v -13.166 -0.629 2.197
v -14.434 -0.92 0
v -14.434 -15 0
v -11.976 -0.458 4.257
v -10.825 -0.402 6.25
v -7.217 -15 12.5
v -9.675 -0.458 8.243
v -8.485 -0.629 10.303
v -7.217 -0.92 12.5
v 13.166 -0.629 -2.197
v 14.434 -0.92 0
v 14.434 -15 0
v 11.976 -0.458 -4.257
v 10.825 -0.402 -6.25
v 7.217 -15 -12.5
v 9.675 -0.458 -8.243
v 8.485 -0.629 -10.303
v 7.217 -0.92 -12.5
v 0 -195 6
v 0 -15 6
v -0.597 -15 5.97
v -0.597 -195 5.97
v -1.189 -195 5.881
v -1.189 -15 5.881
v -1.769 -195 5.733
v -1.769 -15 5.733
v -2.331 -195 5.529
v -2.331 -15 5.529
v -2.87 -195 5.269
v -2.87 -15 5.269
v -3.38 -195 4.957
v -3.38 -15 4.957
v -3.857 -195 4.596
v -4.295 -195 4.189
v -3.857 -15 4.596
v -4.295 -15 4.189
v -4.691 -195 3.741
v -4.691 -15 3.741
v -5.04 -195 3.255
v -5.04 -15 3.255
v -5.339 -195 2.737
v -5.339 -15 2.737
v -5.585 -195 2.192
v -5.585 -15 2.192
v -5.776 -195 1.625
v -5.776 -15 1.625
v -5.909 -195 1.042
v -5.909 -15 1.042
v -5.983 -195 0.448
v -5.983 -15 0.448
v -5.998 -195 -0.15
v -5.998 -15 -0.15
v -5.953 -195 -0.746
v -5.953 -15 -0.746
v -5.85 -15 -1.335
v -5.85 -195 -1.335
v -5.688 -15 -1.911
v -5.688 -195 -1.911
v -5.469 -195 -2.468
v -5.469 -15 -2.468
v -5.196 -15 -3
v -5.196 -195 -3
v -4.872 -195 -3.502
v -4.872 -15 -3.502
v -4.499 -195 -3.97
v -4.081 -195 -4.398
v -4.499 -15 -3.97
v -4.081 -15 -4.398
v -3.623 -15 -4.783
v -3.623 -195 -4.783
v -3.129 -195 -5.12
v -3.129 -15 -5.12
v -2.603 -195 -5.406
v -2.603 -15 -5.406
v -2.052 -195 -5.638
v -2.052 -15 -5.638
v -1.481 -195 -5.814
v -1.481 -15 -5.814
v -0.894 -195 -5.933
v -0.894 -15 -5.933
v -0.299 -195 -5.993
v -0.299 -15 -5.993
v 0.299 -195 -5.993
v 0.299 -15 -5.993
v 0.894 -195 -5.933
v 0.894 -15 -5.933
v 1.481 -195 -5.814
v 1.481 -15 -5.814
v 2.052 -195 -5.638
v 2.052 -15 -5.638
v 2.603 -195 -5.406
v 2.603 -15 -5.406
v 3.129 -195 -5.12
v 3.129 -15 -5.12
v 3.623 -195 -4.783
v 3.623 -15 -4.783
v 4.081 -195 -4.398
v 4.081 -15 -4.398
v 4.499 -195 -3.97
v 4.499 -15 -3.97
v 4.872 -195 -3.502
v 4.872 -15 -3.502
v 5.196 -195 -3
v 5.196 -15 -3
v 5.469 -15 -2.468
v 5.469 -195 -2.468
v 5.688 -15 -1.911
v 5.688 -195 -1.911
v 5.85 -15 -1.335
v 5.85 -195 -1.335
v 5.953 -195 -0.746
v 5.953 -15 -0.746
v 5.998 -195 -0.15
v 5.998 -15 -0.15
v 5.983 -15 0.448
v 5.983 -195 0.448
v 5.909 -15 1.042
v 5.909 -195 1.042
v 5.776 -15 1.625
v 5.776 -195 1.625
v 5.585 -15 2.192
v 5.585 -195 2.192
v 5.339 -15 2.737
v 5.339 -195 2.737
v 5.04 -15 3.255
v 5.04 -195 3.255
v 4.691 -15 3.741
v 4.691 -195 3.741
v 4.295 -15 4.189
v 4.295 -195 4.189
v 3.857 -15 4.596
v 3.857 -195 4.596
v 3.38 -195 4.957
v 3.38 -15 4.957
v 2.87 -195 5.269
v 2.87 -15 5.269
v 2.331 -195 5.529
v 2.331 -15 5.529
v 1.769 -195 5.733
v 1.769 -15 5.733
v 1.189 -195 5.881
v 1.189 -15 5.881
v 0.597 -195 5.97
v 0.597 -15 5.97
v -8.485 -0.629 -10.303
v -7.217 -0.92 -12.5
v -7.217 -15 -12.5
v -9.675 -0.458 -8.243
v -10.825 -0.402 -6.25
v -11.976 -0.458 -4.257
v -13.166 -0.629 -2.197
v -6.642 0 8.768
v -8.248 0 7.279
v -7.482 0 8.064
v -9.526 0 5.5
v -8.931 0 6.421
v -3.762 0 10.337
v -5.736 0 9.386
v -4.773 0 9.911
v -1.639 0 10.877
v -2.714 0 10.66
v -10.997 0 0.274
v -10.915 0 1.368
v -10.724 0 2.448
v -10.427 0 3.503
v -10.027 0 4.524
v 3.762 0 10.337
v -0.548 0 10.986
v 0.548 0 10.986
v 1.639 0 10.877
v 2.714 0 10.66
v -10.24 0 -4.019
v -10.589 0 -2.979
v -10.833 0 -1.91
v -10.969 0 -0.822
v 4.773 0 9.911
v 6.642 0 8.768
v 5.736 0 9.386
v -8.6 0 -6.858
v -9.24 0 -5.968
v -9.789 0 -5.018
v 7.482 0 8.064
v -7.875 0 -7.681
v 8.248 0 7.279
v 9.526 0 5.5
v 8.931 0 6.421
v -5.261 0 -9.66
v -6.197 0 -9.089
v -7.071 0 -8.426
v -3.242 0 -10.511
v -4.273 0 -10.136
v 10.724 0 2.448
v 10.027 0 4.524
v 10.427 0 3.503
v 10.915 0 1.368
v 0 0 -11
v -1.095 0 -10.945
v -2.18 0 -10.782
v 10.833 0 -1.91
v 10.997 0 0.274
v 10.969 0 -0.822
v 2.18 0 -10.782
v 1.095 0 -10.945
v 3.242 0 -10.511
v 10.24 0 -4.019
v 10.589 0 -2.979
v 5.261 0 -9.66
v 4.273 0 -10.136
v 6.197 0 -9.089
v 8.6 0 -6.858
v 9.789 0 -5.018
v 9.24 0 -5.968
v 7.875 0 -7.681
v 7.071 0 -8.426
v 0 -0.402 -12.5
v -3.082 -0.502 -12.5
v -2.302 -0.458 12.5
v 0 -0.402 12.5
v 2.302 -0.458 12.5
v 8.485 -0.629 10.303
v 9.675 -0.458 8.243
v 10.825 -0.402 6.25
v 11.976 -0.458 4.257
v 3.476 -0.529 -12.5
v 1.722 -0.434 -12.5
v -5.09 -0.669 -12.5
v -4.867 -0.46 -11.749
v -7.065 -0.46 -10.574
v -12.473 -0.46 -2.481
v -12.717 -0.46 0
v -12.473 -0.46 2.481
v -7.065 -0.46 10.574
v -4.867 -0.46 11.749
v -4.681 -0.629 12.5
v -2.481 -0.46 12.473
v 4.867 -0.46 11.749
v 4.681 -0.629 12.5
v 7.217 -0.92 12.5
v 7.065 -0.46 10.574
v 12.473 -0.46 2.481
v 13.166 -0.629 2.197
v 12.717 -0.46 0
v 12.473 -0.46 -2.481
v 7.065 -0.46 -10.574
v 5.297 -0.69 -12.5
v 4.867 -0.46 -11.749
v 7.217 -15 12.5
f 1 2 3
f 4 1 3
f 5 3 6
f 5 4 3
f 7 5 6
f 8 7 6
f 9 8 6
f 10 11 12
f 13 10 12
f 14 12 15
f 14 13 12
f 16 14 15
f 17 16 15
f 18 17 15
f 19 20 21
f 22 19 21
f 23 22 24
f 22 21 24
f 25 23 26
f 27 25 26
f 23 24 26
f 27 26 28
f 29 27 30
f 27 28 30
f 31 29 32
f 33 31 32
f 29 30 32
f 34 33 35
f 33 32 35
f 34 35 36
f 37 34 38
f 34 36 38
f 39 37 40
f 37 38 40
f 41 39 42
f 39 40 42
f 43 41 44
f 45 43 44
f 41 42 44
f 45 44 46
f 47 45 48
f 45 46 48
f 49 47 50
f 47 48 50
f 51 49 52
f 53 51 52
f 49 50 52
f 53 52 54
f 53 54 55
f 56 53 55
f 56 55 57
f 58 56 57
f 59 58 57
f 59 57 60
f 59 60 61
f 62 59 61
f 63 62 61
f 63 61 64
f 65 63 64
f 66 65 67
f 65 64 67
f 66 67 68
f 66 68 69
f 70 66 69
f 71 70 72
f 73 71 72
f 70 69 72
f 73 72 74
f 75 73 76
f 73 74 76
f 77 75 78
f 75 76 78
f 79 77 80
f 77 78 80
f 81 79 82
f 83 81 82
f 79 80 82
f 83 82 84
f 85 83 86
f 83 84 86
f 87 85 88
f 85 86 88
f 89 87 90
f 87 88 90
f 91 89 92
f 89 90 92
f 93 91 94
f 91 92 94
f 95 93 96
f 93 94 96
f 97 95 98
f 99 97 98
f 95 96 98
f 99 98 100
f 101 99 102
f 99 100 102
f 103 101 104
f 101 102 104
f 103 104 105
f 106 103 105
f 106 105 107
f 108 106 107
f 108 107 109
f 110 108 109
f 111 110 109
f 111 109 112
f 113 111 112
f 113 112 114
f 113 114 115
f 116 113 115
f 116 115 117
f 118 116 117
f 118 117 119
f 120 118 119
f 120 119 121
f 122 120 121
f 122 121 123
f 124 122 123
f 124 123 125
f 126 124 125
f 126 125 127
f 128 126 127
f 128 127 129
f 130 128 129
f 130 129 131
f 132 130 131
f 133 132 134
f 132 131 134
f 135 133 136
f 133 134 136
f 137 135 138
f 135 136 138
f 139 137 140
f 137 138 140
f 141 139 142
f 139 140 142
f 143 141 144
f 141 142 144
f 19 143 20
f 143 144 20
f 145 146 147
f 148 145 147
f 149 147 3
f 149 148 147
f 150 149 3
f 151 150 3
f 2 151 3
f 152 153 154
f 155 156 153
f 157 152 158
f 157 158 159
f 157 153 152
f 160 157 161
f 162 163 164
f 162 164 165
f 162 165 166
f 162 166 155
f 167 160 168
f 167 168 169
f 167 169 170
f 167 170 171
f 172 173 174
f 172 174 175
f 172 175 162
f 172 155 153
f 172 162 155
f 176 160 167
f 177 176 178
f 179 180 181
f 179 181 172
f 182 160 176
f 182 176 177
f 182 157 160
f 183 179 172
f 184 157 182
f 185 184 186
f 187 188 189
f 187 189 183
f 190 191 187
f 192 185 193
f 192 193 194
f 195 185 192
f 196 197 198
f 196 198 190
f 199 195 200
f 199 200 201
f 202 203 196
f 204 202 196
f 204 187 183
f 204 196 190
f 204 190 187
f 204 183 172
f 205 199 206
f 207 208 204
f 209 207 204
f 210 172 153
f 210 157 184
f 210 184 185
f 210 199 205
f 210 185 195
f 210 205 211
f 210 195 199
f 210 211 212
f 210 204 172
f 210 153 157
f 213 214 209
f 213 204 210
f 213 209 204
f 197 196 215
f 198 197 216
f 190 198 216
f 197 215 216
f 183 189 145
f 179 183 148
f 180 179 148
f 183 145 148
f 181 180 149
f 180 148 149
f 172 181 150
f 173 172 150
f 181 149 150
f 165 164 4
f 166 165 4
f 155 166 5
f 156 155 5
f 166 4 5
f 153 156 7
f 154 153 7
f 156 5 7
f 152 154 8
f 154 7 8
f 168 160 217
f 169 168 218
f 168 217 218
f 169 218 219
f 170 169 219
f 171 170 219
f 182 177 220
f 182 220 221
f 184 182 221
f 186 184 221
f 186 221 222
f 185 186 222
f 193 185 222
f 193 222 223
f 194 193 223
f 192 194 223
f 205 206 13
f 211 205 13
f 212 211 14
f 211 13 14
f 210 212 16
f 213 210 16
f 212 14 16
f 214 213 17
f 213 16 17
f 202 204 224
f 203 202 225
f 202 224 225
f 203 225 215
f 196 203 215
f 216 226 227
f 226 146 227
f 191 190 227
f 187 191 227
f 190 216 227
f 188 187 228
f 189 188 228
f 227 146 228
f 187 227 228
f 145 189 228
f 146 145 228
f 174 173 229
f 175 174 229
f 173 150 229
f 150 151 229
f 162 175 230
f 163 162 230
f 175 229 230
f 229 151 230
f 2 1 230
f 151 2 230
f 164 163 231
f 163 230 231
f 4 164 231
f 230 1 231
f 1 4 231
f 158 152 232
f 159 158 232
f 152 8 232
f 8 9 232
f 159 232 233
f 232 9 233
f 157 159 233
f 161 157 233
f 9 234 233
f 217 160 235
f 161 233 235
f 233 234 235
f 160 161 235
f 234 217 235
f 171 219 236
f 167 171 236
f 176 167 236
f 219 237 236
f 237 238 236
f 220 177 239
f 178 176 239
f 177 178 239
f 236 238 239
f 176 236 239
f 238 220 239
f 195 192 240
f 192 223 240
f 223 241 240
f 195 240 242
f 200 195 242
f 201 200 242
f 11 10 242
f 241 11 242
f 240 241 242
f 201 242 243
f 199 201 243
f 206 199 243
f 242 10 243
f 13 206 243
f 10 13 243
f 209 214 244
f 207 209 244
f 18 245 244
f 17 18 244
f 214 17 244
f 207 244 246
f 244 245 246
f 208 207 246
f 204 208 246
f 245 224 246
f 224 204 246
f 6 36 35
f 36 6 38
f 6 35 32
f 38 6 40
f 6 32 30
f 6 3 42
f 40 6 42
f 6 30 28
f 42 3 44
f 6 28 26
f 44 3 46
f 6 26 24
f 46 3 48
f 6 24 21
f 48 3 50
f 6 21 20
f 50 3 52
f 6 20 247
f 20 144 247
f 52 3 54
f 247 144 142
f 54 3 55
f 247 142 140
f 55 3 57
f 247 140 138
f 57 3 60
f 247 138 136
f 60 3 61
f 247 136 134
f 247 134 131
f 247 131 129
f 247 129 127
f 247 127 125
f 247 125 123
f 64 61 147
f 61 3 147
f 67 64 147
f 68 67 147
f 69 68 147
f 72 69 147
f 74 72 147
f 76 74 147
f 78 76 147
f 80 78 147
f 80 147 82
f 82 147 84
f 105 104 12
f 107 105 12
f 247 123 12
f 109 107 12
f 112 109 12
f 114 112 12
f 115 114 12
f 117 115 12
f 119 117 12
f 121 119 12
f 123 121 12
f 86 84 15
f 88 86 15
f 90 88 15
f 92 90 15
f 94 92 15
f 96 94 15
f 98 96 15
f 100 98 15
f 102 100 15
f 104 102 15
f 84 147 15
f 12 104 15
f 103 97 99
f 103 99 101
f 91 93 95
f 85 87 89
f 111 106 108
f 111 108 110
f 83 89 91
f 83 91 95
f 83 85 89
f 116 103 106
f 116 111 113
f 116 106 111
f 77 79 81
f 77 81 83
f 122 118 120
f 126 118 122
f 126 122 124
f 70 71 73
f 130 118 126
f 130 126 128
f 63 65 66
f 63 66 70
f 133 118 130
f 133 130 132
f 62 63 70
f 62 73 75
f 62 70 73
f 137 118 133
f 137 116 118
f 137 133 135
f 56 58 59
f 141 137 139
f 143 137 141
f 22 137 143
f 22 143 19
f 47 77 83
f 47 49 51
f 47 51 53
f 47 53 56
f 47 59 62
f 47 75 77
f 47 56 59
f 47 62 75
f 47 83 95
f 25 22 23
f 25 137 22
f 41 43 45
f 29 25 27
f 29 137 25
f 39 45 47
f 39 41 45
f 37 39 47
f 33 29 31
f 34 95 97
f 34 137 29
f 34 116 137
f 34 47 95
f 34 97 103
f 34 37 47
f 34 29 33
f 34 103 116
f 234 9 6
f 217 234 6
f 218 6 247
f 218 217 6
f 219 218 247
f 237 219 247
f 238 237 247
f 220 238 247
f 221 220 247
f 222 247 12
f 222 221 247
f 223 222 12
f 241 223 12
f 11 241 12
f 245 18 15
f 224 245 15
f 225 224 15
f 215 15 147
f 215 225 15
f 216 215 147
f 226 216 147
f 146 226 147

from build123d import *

# Parameters (mm, degrees)
EXTRUDE_1_DEPTH = 15
SKETCH_2_R      = 6
EXTRUDE_2_DEPTH = 180


with BuildPart() as part:
    # 草图1 → 凸台-拉伸1 (new body)
    with BuildSketch(Plane(origin=(0, 0, 0), x_dir=(1, 0, 0), z_dir=(0, 1, 0))):
        Polygon((-7.216878365, 12.5), (-14.43375673, 0), (-7.216878365, -12.5), (7.216878365, -12.5), (14.43375673, 0), (7.216878365, 12.5), align=None)
    extrude(amount=-EXTRUDE_1_DEPTH)

    # 草图2 → 凸台-拉伸2 (add)
    with BuildSketch(Plane.XZ.offset(15)):
        with Locations(Location((0, 0, 0), (0, 0, 90))):
            Circle(SKETCH_2_R)
    extrude(amount=EXTRUDE_2_DEPTH)

    # 草图9 → 切除-旋转1 (revolve, cut)
    with BuildSketch(Plane.XY, mode=Mode.PRIVATE) as cut_revolve_1_sk:
        Polygon((11, 0), (14.43375673, -0.920072343), (14.43375673, 0), align=None)
    revolve(cut_revolve_1_sk.sketch.rotate(Axis((0, -195, 0), (0, 1, 0)), 90), axis=Axis((0, -195, 0), (0, 1, 0)), mode=Mode.SUBTRACT)


solid = part.part
